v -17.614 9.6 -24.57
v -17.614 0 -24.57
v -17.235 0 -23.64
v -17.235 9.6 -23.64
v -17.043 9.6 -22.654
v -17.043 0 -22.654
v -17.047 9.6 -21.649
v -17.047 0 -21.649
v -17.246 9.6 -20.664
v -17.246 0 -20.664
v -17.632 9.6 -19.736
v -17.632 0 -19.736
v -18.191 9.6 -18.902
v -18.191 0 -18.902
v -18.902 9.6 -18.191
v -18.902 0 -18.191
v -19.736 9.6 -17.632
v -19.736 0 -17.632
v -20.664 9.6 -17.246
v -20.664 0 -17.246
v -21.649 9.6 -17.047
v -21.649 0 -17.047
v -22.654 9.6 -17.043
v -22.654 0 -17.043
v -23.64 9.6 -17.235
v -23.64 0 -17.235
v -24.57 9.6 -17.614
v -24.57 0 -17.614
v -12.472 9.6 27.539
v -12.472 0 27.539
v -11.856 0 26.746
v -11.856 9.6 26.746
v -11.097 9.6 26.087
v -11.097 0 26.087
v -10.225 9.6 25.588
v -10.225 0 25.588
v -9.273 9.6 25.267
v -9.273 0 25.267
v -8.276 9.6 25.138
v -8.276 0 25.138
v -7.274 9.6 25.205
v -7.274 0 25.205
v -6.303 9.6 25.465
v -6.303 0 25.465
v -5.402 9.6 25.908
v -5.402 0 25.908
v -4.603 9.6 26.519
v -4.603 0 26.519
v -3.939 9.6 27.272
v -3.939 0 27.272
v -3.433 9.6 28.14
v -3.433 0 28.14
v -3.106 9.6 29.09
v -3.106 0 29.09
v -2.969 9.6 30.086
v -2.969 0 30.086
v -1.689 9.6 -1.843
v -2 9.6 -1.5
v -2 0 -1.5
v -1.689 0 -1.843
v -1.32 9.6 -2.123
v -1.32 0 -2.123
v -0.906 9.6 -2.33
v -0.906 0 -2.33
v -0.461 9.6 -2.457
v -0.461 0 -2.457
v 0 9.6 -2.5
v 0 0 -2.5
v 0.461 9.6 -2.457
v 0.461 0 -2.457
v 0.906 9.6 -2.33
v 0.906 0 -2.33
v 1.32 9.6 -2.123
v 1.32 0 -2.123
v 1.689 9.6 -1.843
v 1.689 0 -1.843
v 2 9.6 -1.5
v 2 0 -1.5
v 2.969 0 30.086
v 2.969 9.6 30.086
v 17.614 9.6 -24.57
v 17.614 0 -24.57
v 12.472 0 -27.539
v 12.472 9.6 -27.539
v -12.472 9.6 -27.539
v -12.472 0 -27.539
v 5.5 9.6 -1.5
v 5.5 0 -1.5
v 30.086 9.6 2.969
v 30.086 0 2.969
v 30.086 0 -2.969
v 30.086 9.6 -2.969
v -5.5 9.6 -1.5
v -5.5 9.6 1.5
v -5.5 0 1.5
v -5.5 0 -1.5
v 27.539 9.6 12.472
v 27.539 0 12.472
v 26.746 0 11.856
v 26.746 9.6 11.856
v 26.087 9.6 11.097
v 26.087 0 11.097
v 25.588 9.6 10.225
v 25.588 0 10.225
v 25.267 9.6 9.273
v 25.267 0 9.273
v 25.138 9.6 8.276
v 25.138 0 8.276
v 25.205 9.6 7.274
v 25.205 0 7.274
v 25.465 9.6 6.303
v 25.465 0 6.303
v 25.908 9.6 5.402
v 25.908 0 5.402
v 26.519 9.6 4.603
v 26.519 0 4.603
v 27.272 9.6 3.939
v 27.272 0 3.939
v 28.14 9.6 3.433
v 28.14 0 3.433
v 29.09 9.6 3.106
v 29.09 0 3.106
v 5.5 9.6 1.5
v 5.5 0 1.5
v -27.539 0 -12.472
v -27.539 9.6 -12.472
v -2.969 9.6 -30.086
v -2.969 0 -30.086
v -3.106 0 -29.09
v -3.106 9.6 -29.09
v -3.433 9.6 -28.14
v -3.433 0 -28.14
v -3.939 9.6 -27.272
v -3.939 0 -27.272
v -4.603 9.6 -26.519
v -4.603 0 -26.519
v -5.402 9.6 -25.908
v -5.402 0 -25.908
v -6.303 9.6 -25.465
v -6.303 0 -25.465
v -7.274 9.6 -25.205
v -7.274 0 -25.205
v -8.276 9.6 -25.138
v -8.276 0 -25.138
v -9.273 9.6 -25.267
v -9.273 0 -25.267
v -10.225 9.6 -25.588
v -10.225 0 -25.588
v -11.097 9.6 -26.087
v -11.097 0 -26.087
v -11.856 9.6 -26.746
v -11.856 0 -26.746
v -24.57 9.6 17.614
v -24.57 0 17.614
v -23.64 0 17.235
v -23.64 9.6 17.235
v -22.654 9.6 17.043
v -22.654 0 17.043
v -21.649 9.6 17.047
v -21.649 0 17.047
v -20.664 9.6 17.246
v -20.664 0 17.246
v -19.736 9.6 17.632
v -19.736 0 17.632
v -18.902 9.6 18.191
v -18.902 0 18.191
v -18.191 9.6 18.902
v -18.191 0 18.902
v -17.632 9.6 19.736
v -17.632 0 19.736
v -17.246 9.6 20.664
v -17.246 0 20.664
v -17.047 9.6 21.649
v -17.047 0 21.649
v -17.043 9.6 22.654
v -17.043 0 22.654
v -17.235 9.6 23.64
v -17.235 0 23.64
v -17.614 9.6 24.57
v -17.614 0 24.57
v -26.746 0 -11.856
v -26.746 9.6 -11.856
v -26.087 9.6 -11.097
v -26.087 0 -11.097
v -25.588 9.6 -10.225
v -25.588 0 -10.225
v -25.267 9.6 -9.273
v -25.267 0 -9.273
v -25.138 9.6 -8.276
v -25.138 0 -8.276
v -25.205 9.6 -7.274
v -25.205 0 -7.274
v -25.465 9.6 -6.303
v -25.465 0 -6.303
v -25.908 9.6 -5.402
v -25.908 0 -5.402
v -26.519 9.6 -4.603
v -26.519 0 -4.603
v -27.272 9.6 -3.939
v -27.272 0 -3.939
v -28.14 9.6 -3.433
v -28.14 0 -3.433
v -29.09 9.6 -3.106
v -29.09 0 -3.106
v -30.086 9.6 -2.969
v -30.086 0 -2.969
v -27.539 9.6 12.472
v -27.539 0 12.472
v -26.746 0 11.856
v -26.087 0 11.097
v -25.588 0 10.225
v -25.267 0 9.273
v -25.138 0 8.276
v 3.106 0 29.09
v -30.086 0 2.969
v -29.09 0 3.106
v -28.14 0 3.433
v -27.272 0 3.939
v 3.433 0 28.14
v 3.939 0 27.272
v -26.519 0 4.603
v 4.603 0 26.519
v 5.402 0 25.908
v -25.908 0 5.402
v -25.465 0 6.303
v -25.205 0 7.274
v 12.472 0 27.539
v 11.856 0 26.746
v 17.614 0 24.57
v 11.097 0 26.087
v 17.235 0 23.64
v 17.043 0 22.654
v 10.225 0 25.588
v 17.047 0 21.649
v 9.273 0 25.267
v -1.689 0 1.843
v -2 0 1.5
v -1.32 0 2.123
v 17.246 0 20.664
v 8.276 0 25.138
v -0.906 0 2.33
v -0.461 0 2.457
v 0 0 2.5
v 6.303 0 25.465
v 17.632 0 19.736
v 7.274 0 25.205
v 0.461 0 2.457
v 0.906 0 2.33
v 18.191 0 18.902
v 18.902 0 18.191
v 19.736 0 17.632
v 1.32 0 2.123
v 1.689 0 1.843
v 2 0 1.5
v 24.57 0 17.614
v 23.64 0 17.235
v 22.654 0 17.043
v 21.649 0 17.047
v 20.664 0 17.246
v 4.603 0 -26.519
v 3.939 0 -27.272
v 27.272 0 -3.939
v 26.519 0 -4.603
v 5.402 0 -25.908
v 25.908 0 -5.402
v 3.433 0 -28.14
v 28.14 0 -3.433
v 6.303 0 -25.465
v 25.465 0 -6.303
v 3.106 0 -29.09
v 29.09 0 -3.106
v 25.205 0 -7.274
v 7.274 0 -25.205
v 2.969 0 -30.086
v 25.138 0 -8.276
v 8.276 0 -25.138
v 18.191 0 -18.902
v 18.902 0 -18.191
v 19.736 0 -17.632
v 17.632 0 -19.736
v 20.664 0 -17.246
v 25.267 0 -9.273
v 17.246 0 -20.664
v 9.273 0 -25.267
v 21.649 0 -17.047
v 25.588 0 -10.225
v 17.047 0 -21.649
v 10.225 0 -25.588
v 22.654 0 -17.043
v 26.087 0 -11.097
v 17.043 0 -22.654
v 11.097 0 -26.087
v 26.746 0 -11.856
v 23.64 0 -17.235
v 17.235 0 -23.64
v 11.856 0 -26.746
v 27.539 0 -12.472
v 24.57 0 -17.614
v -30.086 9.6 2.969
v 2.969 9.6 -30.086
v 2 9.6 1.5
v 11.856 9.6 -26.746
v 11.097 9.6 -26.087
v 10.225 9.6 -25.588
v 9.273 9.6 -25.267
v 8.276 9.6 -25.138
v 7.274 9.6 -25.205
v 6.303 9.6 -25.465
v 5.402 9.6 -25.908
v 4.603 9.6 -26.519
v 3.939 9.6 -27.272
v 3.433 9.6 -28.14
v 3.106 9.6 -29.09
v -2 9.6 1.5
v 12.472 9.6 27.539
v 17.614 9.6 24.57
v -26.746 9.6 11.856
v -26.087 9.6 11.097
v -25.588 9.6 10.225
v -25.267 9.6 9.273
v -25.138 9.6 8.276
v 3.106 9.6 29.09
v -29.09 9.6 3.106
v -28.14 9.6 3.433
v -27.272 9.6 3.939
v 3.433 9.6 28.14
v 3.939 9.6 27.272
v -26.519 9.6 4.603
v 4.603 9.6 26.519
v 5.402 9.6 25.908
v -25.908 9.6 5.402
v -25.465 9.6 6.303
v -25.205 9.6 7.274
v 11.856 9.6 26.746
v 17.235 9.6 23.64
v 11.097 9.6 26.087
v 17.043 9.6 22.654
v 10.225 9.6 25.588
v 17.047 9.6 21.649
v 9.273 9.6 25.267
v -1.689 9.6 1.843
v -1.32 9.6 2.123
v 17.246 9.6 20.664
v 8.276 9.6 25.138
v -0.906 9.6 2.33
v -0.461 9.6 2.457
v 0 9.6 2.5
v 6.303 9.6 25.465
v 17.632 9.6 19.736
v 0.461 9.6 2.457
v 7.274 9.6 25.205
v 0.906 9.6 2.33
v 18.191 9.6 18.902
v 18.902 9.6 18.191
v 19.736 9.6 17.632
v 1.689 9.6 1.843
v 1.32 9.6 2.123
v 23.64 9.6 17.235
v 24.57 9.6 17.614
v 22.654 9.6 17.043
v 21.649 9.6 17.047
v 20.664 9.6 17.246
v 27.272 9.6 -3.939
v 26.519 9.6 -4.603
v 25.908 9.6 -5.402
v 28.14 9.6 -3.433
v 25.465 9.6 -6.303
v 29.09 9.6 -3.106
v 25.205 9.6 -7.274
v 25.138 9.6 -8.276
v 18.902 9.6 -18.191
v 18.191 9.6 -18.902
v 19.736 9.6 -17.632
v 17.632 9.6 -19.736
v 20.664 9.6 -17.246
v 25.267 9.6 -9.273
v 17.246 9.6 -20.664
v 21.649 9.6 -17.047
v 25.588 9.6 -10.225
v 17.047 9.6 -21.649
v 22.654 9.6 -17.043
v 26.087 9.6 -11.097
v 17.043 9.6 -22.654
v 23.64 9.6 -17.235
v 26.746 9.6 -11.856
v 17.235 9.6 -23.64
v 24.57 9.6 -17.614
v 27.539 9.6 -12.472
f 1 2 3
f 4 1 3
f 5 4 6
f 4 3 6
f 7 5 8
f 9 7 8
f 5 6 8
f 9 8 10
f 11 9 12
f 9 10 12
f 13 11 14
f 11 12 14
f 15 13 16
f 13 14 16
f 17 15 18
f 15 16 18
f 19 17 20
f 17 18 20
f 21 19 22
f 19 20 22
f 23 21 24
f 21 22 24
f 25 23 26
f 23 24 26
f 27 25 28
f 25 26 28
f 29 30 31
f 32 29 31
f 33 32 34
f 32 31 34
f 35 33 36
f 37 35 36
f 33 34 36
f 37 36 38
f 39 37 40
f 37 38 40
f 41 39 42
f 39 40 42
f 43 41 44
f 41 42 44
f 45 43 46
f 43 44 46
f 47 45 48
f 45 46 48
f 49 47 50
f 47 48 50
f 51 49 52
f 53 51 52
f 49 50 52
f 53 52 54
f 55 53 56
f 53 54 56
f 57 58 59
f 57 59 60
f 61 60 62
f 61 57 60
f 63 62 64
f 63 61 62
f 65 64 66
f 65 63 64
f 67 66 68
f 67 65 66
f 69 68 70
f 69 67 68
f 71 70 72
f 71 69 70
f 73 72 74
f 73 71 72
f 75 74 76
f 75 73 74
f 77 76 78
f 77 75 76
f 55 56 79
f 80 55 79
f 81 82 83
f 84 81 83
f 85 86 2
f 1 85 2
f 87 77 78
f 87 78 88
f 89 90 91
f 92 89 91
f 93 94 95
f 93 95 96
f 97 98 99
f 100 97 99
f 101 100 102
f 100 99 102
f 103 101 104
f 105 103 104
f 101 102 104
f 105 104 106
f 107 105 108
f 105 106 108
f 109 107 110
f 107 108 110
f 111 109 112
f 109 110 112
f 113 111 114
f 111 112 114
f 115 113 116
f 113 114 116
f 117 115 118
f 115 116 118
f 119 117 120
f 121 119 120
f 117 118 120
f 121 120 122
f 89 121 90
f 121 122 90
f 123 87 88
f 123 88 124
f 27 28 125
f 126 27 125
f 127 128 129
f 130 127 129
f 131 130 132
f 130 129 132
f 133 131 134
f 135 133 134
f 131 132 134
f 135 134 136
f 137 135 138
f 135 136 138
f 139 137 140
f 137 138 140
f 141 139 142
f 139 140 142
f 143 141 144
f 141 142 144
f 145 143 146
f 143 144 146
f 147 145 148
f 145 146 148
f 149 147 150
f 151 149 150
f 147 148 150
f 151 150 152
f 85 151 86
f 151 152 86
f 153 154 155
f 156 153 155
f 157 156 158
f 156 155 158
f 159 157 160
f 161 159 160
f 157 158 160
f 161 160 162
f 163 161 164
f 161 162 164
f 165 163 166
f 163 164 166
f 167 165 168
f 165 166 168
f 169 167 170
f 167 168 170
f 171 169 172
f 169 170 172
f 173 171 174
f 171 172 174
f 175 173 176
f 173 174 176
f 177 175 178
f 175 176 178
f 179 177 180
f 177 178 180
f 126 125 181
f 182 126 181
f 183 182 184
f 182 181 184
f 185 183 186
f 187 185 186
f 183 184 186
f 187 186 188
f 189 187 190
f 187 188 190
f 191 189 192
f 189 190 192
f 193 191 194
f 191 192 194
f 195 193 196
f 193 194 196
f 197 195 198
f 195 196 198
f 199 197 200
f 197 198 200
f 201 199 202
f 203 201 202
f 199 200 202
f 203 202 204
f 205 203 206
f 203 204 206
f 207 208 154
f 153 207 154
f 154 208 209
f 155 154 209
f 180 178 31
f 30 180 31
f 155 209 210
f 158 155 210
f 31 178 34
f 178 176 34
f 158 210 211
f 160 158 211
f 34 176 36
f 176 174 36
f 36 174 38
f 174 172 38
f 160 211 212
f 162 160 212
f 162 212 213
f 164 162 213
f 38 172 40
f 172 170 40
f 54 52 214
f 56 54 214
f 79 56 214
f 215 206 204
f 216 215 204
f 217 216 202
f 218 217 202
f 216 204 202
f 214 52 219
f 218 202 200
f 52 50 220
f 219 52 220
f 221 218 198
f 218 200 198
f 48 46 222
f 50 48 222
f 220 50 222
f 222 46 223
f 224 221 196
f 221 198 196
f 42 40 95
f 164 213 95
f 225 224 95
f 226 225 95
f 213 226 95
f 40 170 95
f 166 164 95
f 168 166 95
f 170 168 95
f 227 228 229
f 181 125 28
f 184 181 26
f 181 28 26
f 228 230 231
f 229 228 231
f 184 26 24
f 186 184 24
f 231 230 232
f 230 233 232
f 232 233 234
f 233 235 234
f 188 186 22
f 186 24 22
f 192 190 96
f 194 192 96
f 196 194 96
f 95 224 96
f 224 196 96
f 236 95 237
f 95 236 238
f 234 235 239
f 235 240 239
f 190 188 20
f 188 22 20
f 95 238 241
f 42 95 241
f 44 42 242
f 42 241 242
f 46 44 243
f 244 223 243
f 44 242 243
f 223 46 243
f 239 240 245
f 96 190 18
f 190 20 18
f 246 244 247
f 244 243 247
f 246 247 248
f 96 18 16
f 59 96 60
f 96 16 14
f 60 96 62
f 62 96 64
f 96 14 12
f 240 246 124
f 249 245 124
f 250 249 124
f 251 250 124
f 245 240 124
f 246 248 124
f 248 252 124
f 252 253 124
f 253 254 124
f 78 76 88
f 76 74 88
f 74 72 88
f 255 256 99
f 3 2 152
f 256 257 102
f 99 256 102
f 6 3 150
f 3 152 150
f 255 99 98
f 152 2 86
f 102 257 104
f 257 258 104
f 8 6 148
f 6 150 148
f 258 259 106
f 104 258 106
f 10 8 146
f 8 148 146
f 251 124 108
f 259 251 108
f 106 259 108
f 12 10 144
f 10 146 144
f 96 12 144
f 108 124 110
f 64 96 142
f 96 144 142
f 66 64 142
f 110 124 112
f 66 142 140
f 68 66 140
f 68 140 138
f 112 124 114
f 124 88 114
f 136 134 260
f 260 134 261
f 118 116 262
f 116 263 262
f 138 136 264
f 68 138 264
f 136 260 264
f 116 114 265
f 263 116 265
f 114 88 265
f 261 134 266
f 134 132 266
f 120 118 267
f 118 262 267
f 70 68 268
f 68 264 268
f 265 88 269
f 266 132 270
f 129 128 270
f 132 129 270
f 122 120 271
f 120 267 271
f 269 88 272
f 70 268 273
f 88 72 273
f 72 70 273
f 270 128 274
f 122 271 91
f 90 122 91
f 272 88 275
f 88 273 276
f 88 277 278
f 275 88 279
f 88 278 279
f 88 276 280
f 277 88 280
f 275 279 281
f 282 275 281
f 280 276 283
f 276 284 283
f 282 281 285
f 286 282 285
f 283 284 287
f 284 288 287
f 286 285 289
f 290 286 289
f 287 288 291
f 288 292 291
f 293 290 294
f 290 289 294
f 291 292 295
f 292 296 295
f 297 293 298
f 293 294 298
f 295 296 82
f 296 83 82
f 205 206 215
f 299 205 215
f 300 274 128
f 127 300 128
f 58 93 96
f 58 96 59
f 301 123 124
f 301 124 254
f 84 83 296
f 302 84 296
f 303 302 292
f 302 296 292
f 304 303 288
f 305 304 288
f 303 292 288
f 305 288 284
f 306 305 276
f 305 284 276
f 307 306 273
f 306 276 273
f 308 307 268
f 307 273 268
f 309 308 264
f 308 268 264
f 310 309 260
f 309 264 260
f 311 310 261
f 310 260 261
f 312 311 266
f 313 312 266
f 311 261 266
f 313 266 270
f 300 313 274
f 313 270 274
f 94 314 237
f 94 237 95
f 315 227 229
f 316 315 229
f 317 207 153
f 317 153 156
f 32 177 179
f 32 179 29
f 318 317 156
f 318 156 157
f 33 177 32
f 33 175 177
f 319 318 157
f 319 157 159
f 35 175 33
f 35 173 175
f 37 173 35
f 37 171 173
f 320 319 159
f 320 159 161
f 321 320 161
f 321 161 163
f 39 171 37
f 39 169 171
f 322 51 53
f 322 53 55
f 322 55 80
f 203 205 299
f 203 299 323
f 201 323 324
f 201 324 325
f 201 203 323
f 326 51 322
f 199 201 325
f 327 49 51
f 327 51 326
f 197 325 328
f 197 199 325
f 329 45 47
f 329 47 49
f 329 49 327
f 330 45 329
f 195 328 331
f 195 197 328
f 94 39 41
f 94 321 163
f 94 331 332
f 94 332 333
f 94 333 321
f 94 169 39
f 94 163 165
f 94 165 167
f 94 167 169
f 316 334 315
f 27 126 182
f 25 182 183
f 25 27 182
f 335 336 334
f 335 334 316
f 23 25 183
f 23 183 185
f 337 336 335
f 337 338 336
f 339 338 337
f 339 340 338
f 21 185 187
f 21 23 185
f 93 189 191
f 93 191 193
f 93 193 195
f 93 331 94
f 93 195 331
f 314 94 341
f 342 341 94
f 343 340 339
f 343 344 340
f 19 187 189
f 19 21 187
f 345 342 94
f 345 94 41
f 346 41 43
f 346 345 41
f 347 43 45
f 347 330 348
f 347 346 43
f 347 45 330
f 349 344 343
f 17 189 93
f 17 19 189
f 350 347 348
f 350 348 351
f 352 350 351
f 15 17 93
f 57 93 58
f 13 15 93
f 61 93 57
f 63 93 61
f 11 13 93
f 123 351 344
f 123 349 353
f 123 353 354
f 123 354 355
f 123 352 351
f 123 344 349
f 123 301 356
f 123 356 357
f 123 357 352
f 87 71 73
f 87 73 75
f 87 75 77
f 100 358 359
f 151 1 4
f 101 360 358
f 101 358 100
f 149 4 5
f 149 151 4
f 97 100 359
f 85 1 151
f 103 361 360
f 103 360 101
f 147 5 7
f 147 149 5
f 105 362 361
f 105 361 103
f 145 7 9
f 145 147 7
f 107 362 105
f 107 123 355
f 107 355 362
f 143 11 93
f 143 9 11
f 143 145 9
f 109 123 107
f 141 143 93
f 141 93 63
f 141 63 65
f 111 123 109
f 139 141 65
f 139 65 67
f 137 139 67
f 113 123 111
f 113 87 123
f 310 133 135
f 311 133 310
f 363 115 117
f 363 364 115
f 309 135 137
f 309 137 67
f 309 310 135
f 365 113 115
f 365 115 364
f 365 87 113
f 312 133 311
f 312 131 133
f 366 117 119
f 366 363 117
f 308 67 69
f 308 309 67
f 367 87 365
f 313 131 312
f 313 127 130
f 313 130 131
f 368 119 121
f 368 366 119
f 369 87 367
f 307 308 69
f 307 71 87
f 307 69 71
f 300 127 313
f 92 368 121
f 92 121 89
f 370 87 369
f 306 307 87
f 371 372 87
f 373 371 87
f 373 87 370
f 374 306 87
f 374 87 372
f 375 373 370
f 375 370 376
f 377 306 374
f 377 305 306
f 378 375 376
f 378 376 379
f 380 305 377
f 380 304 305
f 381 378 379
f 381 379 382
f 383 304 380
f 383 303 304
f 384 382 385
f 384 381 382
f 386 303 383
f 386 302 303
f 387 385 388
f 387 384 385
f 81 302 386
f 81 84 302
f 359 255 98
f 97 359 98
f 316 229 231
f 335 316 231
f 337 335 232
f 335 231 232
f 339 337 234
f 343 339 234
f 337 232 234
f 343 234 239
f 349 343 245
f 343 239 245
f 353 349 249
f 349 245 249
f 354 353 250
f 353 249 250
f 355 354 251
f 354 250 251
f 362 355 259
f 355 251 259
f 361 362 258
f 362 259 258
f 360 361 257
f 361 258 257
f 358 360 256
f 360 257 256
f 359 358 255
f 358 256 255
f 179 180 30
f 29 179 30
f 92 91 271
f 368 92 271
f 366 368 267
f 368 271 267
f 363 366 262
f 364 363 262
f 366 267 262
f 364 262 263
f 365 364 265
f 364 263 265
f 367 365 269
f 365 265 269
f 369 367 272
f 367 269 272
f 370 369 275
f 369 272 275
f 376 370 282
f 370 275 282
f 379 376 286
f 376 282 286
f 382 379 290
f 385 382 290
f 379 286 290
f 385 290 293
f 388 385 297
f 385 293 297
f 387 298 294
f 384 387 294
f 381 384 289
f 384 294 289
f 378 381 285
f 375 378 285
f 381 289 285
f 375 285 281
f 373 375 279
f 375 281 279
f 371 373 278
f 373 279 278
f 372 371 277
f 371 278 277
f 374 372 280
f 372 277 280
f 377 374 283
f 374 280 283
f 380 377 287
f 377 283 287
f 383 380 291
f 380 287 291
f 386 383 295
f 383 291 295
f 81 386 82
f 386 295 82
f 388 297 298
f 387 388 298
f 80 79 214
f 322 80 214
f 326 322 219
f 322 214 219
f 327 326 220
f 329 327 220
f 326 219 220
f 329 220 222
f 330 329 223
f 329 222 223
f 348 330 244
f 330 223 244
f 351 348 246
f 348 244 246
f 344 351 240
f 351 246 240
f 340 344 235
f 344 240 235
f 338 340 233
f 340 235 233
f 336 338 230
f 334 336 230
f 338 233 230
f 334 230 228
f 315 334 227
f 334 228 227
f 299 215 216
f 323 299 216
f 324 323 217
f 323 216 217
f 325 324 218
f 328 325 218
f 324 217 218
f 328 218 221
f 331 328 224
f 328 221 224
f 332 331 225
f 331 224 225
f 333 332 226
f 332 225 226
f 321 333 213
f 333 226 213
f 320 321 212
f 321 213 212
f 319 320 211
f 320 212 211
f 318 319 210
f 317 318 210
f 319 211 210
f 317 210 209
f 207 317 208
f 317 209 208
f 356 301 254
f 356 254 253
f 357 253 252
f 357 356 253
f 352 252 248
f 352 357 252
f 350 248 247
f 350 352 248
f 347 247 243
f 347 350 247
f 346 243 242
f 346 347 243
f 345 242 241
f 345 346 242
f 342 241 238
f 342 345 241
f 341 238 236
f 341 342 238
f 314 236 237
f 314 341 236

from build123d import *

# Parameters (mm, degrees)
BOSS_EXTRUDE1_DEPTH = 9.6
CUT_EXTRUDE1_DEPTH  = 44.617034843


with BuildPart() as part:
    # Sketch1 → Boss-Extrude1 (new body)
    with BuildSketch(Plane(origin=(0, 0, 0), x_dir=(1, 0, 0), z_dir=(0, 1, 0))):
        with BuildLine():
            ThreePointArc((-12.471666355, -27.539329703), (-6.782081918, -25.311074298), (-2.96888496, -30.085592303))
            Line((-2.96888496, -30.085592303), (2.96888496, -30.085592303))
            ThreePointArc((2.96888496, -30.085592303), (6.782081918, -25.311074298), (12.471666355, -27.539329703))
            Line((12.471666355, -27.539329703), (17.613925948, -24.570444742))
            ThreePointArc((17.613925948, -24.570444742), (18.52899238, -18.52899238), (24.570444742, -17.613925948))
            Line((24.570444742, -17.613925948), (27.539329703, -12.471666355))
            ThreePointArc((27.539329703, -12.471666355), (25.311074298, -6.782081918), (30.085592303, -2.96888496))
            Line((30.085592303, -2.96888496), (30.085592303, 2.96888496))
            ThreePointArc((30.085592303, 2.96888496), (25.311074298, 6.782081918), (27.539329703, 12.471666355))
            Line((27.539329703, 12.471666355), (24.570444742, 17.613925948))
            ThreePointArc((24.570444742, 17.613925948), (18.52899238, 18.52899238), (17.613925948, 24.570444742))
            Line((17.613925948, 24.570444742), (12.471666355, 27.539329703))
            ThreePointArc((12.471666355, 27.539329703), (6.782081918, 25.311074298), (2.96888496, 30.085592303))
            Line((2.96888496, 30.085592303), (-2.96888496, 30.085592303))
            ThreePointArc((-2.96888496, 30.085592303), (-6.782081918, 25.311074298), (-12.471666355, 27.539329703))
            Line((-12.471666355, 27.539329703), (-17.613925948, 24.570444742))
            ThreePointArc((-17.613925948, 24.570444742), (-18.52899238, 18.52899238), (-24.570444742, 17.613925948))
            Line((-24.570444742, 17.613925948), (-27.539329703, 12.471666355))
            ThreePointArc((-27.539329703, 12.471666355), (-25.311074298, 6.782081918), (-30.085592303, 2.96888496))
            Line((-30.085592303, 2.96888496), (-30.085592303, -2.96888496))
            ThreePointArc((-30.085592303, -2.96888496), (-25.311074298, -6.782081918), (-27.539329703, -12.471666355))
            Line((-27.539329703, -12.471666355), (-24.570444742, -17.613925948))
            ThreePointArc((-24.570444742, -17.613925948), (-18.52899238, -18.52899238), (-17.613925948, -24.570444742))
            Line((-17.613925948, -24.570444742), (-12.471666355, -27.539329703))
        make_face()
    extrude(amount=BOSS_EXTRUDE1_DEPTH)

    # Sketch2 → Cut-Extrude1 (cut, through all)
    with BuildSketch(Plane(origin=(0, 9.6, 0), x_dir=(1, 0, 0), z_dir=(0, 1, 0))):
        with BuildLine():
            Line((-2, -1.5), (-5.5, -1.5))
            Line((-5.5, -1.5), (-5.5, 1.5))
            Line((-5.5, 1.5), (-2, 1.5))
            ThreePointArc((-2, 1.5), (0, 2.5), (2, 1.5))
            Line((2, 1.5), (5.5, 1.5))
            Line((5.5, 1.5), (5.5, -1.5))
            Line((5.5, -1.5), (2, -1.5))
            ThreePointArc((2, -1.5), (0, -2.5), (-2, -1.5))
        make_face()
    extrude(amount=-CUT_EXTRUDE1_DEPTH, mode=Mode.SUBTRACT)


solid = part.part
